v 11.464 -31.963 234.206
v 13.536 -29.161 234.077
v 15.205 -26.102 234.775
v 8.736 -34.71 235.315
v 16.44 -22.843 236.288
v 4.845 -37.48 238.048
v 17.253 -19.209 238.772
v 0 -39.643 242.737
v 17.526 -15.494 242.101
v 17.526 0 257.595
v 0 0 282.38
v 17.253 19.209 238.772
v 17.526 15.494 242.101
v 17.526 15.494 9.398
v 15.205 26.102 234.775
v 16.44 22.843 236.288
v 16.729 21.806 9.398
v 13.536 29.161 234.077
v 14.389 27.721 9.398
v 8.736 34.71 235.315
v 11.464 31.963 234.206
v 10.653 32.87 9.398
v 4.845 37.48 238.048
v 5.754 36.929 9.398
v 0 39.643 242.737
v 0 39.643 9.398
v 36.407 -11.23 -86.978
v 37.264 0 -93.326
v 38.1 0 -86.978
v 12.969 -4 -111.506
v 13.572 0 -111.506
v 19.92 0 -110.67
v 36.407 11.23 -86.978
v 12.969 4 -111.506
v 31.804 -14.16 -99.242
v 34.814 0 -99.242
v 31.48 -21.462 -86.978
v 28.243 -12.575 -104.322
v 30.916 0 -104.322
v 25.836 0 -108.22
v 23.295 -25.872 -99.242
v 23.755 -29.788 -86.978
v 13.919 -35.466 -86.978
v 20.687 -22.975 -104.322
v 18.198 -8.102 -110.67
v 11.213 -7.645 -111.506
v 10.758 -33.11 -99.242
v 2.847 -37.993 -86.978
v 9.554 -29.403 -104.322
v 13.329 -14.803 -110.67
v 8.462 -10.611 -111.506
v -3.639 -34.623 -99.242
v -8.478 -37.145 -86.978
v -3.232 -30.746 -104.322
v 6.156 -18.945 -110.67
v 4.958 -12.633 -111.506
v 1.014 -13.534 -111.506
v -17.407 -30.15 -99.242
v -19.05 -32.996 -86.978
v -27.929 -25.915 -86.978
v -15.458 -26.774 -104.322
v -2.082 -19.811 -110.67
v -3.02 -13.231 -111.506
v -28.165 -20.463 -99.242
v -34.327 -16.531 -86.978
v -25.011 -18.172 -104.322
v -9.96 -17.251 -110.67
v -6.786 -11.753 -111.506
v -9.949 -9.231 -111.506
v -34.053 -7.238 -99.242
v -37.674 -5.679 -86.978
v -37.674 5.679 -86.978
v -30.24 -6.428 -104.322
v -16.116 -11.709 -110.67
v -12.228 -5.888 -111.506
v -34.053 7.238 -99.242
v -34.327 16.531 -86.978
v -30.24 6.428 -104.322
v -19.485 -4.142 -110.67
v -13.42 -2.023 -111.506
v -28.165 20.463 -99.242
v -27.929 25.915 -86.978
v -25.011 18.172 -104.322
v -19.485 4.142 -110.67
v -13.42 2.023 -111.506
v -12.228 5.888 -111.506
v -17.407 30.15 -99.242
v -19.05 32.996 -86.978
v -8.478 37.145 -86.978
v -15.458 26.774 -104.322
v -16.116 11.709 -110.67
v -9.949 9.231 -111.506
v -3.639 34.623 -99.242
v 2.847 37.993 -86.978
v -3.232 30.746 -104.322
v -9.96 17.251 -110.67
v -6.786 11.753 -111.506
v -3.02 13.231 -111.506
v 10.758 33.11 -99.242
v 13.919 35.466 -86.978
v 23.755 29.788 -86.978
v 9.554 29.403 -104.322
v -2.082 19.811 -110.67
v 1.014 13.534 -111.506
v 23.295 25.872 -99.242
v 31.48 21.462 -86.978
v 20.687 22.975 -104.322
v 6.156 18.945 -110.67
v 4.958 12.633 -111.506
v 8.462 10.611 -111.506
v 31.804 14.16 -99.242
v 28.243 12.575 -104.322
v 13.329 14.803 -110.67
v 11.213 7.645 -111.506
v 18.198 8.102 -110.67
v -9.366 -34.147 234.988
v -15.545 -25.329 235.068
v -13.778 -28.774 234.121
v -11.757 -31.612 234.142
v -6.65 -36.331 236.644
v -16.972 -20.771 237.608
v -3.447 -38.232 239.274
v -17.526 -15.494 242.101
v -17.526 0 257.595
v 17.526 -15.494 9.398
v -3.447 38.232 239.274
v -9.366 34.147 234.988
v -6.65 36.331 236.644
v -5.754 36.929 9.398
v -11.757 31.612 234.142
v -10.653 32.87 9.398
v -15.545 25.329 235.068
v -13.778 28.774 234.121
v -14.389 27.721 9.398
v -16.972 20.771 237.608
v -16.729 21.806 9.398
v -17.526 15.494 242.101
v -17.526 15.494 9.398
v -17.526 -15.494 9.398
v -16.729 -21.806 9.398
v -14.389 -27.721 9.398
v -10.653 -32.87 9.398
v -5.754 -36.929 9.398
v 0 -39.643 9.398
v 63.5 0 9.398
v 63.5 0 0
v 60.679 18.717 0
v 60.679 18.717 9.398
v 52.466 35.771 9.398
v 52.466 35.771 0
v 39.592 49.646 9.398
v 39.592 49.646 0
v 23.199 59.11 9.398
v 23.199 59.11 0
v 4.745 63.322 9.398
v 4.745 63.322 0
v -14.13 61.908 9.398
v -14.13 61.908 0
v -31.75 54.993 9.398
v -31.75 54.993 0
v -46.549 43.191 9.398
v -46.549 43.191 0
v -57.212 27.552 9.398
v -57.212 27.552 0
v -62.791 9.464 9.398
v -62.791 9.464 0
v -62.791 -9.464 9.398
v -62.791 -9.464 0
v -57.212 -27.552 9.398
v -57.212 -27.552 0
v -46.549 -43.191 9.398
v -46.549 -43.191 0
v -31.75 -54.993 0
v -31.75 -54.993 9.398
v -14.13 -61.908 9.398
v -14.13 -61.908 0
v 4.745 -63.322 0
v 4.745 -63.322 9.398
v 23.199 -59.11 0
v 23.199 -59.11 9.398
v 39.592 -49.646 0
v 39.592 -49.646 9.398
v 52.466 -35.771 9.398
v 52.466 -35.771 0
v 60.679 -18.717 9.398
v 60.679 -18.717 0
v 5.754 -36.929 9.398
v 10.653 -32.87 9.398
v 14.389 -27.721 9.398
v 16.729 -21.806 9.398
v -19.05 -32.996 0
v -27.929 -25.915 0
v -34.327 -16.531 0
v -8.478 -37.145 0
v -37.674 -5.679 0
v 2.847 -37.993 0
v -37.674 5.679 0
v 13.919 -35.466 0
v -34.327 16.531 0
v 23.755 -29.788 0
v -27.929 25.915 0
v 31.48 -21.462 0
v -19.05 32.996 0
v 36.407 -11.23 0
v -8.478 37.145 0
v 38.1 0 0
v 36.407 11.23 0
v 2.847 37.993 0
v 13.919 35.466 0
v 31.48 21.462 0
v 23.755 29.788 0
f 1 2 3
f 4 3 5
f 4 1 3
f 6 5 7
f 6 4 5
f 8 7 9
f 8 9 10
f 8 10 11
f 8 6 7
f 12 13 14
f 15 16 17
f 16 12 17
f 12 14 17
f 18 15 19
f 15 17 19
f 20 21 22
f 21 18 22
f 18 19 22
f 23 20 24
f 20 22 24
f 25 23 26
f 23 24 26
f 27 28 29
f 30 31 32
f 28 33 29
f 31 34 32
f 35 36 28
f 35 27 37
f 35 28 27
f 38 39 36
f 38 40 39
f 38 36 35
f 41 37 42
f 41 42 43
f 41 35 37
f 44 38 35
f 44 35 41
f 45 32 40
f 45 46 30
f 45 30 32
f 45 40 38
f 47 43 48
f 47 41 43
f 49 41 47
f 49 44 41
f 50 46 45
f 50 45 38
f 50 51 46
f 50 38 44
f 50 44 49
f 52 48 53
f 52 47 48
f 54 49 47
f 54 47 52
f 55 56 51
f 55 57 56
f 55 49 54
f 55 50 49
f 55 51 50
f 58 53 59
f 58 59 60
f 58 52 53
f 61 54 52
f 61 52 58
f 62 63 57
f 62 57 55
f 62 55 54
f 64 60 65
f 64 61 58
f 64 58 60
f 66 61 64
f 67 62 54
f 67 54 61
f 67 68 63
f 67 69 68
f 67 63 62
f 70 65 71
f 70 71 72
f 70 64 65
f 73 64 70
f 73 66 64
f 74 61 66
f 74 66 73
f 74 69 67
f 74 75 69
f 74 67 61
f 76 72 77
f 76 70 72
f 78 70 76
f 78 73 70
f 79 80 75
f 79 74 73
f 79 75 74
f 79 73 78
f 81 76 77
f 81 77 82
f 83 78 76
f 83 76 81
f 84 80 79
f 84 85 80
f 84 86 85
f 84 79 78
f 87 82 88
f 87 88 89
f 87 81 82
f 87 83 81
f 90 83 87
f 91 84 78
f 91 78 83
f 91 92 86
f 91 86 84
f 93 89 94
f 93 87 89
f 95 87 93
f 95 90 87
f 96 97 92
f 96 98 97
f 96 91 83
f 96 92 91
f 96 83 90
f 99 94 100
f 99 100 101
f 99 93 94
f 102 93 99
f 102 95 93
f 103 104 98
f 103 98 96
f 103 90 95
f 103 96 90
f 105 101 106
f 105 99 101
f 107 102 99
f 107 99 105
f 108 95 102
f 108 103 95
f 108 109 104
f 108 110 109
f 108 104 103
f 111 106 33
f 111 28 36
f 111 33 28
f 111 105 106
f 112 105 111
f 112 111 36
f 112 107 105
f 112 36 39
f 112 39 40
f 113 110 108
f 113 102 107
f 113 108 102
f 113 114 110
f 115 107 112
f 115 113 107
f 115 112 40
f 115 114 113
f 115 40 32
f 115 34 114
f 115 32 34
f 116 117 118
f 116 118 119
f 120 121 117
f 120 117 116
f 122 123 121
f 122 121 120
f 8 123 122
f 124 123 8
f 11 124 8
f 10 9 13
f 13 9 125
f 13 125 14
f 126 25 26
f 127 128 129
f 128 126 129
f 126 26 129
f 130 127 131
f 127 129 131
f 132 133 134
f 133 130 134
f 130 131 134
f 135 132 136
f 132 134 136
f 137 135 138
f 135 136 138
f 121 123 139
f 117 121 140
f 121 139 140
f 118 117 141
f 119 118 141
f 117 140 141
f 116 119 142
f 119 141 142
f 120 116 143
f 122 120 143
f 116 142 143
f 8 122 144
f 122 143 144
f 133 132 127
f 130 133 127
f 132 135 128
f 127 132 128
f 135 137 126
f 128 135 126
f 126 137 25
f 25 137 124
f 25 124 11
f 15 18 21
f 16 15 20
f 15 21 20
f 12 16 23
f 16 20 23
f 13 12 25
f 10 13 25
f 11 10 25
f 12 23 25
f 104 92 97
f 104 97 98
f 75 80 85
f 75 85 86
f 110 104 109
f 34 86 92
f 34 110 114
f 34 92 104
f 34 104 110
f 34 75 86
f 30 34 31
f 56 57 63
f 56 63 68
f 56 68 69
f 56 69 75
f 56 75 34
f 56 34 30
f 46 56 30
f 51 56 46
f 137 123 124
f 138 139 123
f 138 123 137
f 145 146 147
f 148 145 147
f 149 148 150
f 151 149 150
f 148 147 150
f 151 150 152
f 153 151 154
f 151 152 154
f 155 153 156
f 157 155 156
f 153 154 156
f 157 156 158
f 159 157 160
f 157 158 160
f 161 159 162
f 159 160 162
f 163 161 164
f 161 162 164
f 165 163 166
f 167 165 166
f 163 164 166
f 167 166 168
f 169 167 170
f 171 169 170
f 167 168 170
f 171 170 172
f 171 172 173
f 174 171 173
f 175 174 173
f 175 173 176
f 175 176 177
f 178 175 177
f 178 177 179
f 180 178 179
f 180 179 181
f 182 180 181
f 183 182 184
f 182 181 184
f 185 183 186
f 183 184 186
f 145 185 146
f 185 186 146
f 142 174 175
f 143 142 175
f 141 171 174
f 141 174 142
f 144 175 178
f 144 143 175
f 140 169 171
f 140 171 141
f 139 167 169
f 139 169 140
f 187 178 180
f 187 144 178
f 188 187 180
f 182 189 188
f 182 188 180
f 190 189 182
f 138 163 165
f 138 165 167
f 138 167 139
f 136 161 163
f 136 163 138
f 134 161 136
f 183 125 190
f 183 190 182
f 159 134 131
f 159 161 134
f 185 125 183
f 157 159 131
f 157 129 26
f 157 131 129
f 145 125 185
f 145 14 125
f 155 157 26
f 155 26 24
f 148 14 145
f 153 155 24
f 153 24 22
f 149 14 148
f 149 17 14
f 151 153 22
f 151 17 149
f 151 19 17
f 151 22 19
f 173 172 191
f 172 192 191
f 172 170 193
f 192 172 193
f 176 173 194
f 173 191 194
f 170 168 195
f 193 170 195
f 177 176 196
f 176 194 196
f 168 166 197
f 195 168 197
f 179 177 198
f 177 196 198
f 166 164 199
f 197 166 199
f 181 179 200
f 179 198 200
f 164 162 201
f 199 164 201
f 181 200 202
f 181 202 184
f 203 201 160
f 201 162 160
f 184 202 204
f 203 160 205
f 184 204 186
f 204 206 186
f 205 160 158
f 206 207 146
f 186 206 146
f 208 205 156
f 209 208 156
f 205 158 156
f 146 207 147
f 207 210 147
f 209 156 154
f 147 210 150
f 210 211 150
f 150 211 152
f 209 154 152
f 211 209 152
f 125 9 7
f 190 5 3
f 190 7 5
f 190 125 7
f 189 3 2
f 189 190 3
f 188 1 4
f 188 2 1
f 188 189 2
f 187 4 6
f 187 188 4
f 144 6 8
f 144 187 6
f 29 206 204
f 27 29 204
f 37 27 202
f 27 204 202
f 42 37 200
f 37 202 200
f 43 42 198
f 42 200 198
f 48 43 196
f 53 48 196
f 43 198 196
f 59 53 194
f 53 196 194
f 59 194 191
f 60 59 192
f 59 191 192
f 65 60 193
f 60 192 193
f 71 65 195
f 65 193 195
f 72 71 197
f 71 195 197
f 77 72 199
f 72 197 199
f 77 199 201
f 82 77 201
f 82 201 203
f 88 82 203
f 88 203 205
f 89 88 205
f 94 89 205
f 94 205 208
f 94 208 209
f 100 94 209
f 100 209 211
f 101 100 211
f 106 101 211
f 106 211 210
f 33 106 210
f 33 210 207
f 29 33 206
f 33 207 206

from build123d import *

# Parameters (mm, degrees)
F0_R         = 63.5
F1_DEPTH     = 9.398
F2_R         = 38.1
F3_DEPTH     = 111.506
F4_W         = 35.051997751
F4_H         = 81.7880034447
F5_DEPTH     = 304.8
F6_R         = 24.5284097937
F7_T1_DEPTH  = 296.3349893283
F8_T1_DEPTH  = 227.6667963807
F8_T3_DEPTH  = 227.6667963807
F9_T1_DEPTH  = 194.6467963807
F9_T3_DEPTH  = 194.6467963807
F10_T1_DEPTH = 270.8026681705


# Not quite as in the source:
# - a fillet or chamfer that OpenCascade refuses, or shapes differently, is made with other operations: its cross-section is extruded or revolved along the edge and cut away or added


with BuildPart() as f1:
    # F0 (on Top) → F1 (new body)
    with BuildSketch(Plane.XY):
        Circle(F0_R)
    extrude(amount=F1_DEPTH)

    # F2 (on face) → F3 (join)
    with BuildSketch(Plane(origin=(0, 0, 0), x_dir=(1, 0, 0), z_dir=(0, 0, -1))):
        Circle(F2_R)
    extrude(amount=F3_DEPTH)

    # F4 (on face) → F5 (join)
    with BuildSketch(Plane.XY.offset(9.398)):
        Rectangle(F4_W, F4_H)
    extrude(amount=F5_DEPTH)

    # F6
    f6_edges = [f1.edges().sort_by_distance(p)[0] for p in [
        (-38.1, 0, -111.506),
    ]]
    fillet(f6_edges, radius=F6_R)

    # F7: chamfer of 50.8 on 2 edges, made by hand

    # F7_s2 → F7_t1 (cut)
    with BuildSketch(Plane.YZ.offset(-148.1674946642)):
        Polygon((40.8940017223, 263.398), (-9.9059982777, 314.198), (40.8940017223, 314.198), align=None)
        Polygon((-40.8940017223, 263.398), (9.9059982777, 314.198), (-40.8940017223, 314.198), align=None)
    extrude(amount=F7_T1_DEPTH, mode=Mode.SUBTRACT)

    # F8: chamfer of 33.02 on 2 edges, made by hand

    # F8_s2 → F8_t1 (cut)
    with BuildSketch(Plane(origin=(0, -51.2066322141, 51.2066322141), x_dir=(1, 0, 0), z_dir=(0, -0.7071067812, 0.7071067812))):
        Polygon((17.5259988755, 182.1469378787), (-15.4940011245, 215.1669378787), (17.5259988755, 215.1669378787), align=None)
    extrude(amount=F8_T1_DEPTH, mode=Mode.SUBTRACT)

    # F8_s4 → F8_t3 (cut)
    with BuildSketch(Plane(origin=(0, -212.1913677859, 212.1913677859), x_dir=(1, 0, 0), z_dir=(0, 0.7071067812, -0.7071067812))):
        Polygon((-17.5259988755, -182.1469378787), (15.4940011245, -215.1669378787), (-17.5259988755, -215.1669378787), align=None)
    extrude(amount=F8_T3_DEPTH, mode=Mode.SUBTRACT)

    # F9: chamfer of 33.02 on 2 edges, made by hand

    # F9_s2 → F9_t1 (cut)
    with BuildSketch(Plane(origin=(0, 188.8427018711, 188.8427018711), x_dir=(1, 0, 0), z_dir=(0, -0.7071067812, -0.7071067812))):
        Polygon((-17.5259988755, 182.1469378787), (15.4940011245, 215.1669378787), (-17.5259988755, 215.1669378787), align=None)
    extrude(amount=F9_T1_DEPTH, mode=Mode.SUBTRACT)

    # F9_s4 → F9_t3 (cut)
    with BuildSketch(Plane(origin=(0, 51.2066322141, 51.2066322141), x_dir=(1, 0, 0), z_dir=(0, 0.7071067812, 0.7071067812))):
        Polygon((17.5259988755, -182.1469378787), (-15.4940011245, -215.1669378787), (17.5259988755, -215.1669378787), align=None)
    extrude(amount=F9_T3_DEPTH, mode=Mode.SUBTRACT)

    # F10: fillet of radius 25.4 on 4 edges, made by hand

    # F10_s2 → F10_t1 (cut)
    with BuildSketch(Plane.XY.offset(9.398)):
        with BuildLine():
            ThreePointArc((7.8740011245, 40.8940017223), (-10.0865111176, 33.4545139645), (-17.5259988755, 15.4940017223))
            Line((-17.5259988755, 15.4940017223), (-17.5259988755, 40.8940017223))
            Line((-17.5259988755, 40.8940017223), (7.8740011245, 40.8940017223))
        make_face()
        with BuildLine():
            ThreePointArc((17.5259988755, 15.4940017223), (10.0865111176, 33.4545139645), (-7.8740011245, 40.8940017223))
            Line((-7.8740011245, 40.8940017223), (17.5259988755, 40.8940017223))
            Line((17.5259988755, 40.8940017223), (17.5259988755, 15.4940017223))
        make_face()
        with BuildLine():
            ThreePointArc((-17.5259988755, -15.4940017223), (-10.0865111176, -33.4545139645), (7.8740011245, -40.8940017223))
            Line((7.8740011245, -40.8940017223), (-17.5259988755, -40.8940017223))
            Line((-17.5259988755, -40.8940017223), (-17.5259988755, -15.4940017223))
        make_face()
        with BuildLine():
            ThreePointArc((17.5259988755, -15.4940017223), (10.0865111176, -33.4545139645), (-7.8740011245, -40.8940017223))
            Line((-7.8740011245, -40.8940017223), (17.5259988755, -40.8940017223))
            Line((17.5259988755, -40.8940017223), (17.5259988755, -15.4940017223))
        make_face()
    extrude(amount=F10_T1_DEPTH, mode=Mode.SUBTRACT)


solid = f1.part
